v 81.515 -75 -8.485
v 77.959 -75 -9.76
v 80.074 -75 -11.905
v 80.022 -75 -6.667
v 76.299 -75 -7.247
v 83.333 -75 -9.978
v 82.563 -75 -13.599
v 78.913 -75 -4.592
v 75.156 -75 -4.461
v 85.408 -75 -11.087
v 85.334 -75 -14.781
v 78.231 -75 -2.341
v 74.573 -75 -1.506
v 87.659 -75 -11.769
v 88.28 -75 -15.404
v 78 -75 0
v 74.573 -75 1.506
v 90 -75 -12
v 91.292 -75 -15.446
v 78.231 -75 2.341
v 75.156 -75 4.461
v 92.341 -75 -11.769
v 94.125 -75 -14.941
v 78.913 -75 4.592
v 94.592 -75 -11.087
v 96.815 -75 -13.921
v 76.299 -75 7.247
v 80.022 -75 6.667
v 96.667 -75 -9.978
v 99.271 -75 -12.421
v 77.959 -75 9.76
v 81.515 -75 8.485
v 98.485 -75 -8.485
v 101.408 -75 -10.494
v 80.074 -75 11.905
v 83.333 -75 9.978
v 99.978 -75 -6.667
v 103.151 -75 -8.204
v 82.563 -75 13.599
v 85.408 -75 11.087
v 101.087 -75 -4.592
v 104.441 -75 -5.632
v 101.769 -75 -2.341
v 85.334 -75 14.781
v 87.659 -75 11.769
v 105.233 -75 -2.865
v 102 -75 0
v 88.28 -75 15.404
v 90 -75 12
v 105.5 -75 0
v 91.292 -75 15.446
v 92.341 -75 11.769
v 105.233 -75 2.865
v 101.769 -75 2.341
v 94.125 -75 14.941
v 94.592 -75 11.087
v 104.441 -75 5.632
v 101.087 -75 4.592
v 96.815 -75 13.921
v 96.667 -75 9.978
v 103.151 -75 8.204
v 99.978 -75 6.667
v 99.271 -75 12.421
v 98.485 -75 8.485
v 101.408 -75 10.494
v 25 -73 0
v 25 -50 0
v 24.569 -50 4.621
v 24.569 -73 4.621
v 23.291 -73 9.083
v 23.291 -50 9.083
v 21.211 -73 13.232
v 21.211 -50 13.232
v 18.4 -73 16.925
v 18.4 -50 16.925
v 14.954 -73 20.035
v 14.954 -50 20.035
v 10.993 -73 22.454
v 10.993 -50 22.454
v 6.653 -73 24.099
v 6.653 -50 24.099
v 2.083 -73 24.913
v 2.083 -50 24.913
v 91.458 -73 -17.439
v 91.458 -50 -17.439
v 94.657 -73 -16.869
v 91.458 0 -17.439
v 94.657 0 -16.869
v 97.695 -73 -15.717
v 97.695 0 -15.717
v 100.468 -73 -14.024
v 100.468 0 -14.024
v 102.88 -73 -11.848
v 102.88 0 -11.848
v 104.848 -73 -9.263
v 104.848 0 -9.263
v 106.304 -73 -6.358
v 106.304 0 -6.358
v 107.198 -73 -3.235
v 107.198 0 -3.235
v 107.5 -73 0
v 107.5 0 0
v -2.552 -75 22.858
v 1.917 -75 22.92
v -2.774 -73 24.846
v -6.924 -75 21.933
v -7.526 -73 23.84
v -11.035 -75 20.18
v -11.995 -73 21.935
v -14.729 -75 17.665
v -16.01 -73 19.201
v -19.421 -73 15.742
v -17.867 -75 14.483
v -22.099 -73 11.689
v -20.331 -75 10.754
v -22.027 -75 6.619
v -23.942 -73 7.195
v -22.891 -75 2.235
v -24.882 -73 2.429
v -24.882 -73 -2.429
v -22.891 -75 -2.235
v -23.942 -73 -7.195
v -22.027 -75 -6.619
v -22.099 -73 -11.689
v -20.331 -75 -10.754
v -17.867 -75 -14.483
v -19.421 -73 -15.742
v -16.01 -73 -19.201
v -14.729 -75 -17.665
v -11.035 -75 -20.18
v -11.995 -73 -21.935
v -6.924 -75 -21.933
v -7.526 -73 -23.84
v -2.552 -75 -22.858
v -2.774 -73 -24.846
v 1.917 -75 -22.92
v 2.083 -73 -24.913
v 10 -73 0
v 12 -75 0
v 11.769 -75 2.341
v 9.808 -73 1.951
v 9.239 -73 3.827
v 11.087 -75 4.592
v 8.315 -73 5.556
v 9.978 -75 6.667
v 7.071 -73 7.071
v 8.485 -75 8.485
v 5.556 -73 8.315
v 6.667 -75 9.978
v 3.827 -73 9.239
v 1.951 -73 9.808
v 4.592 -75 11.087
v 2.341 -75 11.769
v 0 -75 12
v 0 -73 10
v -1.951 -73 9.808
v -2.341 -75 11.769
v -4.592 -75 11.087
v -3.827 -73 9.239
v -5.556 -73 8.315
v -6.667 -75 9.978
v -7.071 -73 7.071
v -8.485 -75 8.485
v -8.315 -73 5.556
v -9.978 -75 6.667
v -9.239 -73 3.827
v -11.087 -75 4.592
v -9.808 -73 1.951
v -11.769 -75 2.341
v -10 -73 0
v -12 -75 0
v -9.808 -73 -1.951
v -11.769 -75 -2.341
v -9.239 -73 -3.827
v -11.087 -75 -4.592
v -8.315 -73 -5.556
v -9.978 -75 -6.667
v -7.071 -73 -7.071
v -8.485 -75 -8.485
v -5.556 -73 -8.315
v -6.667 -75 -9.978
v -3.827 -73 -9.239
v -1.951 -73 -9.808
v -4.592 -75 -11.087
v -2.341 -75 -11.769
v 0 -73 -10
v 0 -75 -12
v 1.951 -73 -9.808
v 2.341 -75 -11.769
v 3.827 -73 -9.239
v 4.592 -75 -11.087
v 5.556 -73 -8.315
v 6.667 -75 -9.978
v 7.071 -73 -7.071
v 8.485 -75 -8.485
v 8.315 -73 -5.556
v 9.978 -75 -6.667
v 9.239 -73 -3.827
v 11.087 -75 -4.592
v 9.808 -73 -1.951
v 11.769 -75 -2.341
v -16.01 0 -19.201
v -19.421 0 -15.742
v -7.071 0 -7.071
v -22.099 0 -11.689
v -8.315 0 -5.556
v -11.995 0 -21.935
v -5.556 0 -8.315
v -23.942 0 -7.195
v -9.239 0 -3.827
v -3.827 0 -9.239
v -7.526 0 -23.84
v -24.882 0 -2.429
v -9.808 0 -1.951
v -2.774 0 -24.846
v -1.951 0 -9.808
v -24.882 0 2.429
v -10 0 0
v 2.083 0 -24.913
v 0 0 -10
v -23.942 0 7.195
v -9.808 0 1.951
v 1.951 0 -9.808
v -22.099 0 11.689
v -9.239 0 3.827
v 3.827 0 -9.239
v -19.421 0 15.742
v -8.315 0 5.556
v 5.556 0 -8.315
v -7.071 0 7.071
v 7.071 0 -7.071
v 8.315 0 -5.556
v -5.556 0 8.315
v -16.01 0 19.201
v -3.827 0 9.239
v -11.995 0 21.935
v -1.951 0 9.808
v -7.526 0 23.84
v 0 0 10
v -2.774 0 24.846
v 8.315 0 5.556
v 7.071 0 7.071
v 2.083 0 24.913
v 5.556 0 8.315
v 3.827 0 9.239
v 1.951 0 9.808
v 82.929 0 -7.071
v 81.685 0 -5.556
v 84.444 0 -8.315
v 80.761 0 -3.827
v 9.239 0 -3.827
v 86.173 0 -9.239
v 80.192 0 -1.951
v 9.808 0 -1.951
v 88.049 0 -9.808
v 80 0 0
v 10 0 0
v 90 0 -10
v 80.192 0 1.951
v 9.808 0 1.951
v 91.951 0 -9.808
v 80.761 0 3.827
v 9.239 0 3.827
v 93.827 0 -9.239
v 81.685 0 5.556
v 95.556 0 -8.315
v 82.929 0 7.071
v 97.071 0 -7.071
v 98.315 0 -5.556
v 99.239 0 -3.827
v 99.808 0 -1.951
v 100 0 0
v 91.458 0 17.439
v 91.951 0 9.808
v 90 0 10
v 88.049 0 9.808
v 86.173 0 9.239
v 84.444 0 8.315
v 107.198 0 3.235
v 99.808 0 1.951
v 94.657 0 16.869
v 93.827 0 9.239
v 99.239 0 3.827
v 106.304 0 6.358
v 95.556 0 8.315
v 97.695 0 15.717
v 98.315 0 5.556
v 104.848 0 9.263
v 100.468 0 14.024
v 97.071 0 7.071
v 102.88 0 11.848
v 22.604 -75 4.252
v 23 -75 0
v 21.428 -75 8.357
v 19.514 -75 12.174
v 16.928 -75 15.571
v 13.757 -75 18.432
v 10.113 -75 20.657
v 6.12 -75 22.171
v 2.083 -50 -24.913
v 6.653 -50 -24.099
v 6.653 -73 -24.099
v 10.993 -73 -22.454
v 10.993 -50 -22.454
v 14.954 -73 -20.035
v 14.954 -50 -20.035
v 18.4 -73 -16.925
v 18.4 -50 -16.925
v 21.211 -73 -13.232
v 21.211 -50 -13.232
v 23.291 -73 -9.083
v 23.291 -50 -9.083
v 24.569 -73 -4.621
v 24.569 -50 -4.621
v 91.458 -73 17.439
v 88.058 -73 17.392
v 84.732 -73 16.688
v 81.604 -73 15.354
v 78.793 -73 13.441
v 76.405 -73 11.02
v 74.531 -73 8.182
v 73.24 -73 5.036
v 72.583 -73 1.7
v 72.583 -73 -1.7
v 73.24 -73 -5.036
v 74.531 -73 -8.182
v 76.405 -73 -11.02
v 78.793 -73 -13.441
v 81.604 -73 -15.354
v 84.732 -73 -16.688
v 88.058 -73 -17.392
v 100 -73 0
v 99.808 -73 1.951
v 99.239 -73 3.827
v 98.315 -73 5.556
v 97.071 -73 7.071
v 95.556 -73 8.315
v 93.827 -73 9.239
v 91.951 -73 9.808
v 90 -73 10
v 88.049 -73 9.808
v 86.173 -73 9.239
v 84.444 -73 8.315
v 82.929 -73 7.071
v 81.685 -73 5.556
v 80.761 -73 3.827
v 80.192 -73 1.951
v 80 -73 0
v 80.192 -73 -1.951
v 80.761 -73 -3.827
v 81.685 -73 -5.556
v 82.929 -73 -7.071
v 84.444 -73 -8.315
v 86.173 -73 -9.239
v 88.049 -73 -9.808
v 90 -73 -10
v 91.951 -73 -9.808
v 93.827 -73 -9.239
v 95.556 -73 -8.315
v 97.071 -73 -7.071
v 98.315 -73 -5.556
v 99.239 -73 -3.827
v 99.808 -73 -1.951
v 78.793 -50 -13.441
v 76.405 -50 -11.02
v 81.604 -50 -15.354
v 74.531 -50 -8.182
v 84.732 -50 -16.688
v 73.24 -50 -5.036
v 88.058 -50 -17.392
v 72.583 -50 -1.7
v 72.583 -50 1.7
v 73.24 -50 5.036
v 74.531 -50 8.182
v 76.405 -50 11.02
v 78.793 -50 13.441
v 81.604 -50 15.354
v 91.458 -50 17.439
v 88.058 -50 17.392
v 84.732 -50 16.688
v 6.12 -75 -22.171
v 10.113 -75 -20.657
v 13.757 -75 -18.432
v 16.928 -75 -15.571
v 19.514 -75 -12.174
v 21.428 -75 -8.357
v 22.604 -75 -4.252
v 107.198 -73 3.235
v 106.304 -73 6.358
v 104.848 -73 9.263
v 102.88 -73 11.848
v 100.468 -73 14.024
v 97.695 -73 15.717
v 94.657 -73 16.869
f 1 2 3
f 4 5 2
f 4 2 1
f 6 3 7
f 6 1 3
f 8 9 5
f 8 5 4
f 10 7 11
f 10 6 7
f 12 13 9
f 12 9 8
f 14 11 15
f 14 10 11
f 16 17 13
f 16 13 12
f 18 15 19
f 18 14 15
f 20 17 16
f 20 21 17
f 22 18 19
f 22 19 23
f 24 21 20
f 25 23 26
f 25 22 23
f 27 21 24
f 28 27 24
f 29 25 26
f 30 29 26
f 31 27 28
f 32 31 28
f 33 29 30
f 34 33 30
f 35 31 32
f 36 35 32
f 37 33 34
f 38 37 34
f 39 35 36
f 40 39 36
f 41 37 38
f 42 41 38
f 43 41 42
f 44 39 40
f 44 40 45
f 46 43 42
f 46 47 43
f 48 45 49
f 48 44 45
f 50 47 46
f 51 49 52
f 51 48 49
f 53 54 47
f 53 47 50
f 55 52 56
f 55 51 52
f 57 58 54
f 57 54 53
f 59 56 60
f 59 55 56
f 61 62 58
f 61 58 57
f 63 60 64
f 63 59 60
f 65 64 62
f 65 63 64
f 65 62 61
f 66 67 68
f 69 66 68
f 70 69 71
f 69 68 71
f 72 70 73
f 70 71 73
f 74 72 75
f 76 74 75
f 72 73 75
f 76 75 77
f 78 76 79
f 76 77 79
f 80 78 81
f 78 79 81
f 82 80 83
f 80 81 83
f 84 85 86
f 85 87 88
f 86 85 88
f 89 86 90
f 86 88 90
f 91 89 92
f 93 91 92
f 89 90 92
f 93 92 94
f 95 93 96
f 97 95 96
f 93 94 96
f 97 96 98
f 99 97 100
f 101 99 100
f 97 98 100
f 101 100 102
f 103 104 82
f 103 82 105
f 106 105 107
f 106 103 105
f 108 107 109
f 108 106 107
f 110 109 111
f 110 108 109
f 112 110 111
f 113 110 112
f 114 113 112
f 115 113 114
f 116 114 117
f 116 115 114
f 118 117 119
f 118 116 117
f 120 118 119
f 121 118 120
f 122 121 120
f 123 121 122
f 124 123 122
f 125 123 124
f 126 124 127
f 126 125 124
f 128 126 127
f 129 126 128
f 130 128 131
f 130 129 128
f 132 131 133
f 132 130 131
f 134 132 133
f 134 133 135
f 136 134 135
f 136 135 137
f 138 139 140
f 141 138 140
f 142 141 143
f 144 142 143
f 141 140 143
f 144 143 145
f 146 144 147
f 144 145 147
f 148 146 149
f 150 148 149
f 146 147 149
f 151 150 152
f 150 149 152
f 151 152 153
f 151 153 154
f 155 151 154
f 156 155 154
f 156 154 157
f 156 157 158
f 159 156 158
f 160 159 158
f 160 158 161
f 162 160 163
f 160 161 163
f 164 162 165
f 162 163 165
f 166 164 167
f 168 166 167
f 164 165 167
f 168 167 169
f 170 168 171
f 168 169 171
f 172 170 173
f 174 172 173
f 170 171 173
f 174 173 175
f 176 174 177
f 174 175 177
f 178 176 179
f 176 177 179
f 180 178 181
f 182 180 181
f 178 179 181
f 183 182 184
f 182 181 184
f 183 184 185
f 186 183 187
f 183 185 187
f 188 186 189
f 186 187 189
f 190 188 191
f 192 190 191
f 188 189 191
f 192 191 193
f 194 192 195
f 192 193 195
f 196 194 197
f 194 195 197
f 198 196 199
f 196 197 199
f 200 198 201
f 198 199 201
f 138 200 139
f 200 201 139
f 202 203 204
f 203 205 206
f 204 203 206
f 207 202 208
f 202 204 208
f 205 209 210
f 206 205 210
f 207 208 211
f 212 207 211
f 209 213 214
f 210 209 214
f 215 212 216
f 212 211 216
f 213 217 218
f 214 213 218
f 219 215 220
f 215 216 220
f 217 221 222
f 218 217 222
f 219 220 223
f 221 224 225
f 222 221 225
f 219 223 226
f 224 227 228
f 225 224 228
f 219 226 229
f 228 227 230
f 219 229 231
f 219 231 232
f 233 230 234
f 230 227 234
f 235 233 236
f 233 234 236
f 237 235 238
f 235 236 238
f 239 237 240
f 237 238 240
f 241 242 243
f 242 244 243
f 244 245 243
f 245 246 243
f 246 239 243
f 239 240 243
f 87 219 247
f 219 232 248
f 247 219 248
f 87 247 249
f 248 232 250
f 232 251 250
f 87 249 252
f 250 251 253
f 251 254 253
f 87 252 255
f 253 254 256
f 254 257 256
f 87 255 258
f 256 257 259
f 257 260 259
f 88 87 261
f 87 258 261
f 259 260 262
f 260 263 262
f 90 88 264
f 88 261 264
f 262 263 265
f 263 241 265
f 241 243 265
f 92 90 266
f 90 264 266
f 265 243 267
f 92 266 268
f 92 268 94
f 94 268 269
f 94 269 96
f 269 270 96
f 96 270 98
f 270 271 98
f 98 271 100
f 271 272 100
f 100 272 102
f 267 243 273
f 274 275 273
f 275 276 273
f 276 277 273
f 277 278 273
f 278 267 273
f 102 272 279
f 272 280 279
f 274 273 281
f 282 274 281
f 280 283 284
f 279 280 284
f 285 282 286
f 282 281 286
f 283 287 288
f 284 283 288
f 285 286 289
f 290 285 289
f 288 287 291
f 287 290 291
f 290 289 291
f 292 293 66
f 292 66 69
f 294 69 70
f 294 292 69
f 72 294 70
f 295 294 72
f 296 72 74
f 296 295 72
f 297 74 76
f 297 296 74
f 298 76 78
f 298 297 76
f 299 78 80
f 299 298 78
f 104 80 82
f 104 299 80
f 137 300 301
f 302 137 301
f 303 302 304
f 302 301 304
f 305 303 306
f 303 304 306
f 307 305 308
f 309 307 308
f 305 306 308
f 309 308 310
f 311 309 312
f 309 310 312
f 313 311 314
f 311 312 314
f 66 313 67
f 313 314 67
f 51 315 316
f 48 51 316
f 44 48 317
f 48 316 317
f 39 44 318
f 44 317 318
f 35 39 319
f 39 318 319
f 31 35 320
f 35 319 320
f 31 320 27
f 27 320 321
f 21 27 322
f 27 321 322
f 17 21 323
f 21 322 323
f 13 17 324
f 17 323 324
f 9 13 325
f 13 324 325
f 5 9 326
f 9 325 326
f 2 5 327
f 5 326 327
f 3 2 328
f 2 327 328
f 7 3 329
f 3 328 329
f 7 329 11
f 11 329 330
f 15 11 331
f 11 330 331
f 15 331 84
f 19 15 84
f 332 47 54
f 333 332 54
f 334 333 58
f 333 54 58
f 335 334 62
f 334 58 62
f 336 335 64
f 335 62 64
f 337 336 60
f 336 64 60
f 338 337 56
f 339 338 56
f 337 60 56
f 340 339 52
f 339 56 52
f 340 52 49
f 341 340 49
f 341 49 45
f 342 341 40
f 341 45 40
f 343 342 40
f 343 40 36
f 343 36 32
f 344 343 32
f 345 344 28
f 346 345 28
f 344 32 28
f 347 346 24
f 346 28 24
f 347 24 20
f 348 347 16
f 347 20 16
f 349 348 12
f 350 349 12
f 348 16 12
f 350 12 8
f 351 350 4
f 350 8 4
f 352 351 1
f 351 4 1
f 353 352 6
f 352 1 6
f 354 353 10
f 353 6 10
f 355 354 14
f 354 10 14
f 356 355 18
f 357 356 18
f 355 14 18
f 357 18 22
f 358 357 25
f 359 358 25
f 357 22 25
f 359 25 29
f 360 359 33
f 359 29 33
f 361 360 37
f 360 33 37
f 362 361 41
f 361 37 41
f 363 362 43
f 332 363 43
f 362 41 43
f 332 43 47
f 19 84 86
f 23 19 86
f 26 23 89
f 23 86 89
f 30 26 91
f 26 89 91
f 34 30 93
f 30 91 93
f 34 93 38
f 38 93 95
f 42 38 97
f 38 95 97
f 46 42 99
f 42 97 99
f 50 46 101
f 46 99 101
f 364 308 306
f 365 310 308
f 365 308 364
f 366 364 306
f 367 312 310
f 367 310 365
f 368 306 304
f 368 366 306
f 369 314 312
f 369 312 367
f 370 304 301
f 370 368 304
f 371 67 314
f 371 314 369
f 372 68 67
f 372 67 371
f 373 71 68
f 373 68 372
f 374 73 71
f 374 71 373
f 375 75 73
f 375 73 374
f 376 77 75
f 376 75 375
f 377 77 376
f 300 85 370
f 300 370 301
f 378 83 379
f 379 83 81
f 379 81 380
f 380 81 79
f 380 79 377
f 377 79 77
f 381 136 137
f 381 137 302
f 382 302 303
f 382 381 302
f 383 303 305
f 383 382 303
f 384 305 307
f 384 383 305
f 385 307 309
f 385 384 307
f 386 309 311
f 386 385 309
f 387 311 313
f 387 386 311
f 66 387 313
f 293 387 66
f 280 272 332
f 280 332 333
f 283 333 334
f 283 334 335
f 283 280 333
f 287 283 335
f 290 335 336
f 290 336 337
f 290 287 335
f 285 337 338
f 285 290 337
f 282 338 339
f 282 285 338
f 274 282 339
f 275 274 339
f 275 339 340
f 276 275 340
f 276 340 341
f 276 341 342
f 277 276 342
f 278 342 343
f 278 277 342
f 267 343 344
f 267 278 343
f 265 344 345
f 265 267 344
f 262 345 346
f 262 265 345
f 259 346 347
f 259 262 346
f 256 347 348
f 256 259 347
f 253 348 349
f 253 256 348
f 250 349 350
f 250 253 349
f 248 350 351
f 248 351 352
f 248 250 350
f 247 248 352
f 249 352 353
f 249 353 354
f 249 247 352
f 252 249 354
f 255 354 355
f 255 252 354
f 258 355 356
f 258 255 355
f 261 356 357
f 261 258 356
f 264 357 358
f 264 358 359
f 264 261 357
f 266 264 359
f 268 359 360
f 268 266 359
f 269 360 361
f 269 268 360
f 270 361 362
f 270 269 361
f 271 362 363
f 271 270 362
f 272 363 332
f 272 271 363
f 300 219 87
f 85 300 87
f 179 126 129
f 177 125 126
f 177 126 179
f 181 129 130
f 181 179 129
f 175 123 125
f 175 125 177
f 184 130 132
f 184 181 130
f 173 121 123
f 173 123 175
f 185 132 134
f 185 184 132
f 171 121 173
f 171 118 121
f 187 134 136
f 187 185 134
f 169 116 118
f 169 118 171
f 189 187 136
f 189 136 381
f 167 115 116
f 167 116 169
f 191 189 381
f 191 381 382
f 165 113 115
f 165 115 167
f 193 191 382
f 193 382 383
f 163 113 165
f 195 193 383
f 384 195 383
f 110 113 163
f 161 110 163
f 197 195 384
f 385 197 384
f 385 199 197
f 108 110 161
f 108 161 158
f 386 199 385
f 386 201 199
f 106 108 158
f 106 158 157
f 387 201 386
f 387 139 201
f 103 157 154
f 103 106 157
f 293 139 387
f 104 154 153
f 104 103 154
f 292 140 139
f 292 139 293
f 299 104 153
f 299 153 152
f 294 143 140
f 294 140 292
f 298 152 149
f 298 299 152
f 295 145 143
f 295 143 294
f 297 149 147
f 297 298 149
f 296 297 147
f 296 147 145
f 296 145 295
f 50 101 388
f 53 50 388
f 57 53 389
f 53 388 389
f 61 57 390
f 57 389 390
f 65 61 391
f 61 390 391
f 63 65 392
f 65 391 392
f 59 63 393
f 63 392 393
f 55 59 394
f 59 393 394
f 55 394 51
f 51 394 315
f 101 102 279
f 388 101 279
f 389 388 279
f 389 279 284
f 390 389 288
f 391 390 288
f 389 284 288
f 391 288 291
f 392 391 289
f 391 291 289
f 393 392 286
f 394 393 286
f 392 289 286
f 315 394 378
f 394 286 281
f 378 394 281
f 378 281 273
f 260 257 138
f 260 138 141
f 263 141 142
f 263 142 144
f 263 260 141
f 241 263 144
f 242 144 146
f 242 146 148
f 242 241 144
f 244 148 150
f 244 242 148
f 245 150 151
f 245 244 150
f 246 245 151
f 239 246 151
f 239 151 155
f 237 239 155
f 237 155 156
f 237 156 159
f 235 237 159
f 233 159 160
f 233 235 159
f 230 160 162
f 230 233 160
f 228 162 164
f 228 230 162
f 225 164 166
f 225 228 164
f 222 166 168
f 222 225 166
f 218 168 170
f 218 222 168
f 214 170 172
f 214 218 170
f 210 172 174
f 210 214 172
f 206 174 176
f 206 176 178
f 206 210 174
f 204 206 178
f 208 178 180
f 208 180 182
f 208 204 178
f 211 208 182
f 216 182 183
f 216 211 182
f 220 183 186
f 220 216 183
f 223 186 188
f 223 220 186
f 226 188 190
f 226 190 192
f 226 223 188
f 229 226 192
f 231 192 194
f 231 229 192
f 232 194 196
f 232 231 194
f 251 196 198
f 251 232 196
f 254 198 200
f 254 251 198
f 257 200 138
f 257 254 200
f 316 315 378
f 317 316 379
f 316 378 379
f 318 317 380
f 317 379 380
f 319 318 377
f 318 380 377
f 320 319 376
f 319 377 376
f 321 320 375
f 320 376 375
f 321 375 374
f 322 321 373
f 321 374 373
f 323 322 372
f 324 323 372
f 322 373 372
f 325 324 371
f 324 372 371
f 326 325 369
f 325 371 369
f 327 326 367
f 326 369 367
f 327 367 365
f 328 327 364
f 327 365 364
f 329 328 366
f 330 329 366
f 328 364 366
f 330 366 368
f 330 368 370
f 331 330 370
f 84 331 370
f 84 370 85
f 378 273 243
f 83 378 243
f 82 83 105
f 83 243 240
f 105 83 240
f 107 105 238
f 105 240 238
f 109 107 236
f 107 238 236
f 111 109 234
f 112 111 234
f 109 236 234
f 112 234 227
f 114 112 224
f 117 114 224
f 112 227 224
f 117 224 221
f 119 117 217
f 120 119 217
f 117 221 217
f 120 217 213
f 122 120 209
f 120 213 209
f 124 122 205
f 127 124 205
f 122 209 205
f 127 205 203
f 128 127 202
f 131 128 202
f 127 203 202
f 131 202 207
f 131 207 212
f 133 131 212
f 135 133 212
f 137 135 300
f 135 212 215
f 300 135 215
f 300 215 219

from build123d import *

# Parameters (mm, degrees)
F0_R     = 10
F1_DEPTH = 50
F2_DEPTH = 75
F3_SIZE  = 2


with BuildPart() as f1:
    # F0 (on Front) → F1 (new body)
    with BuildSketch(Plane.XZ):
        with BuildLine():
            ThreePointArc((2.083333, 24.913043), (18.399502, 16.92508), (25, 0))
            ThreePointArc((25, 0), (18.399502, -16.92508), (2.083333, -24.913043))
            Line((2.083333, -24.913043), (91.458333, -17.43913))
            ThreePointArc((91.458333, -17.43913), (72.5, 0), (91.458333, 17.43913))
            Line((91.458333, 17.43913), (2.083333, 24.913043))
        make_face()
        with BuildLine():
            ThreePointArc((2.083333, -24.913043), (18.399502, -16.92508), (25, 0))
            ThreePointArc((25, 0), (18.399502, 16.92508), (2.083333, 24.913043))
            ThreePointArc((2.083333, 24.913043), (-25, 0), (2.083333, -24.913043))
        make_face()
        Circle(F0_R, mode=Mode.SUBTRACT)
        with BuildLine():
            ThreePointArc((107.5, 0), (102.879651, 11.847556), (91.458333, 17.43913))
            ThreePointArc((91.458333, 17.43913), (72.5, 0), (91.458333, -17.43913))
            ThreePointArc((91.458333, -17.43913), (102.879651, -11.847556), (107.5, 0))
        make_face()
        with Locations((90, 0)):
            Circle(F0_R, mode=Mode.SUBTRACT)
    extrude(amount=F1_DEPTH)

    # F0 (on Front) → F2 (join)
    with BuildSketch(Plane.XZ):
        with BuildLine():
            ThreePointArc((2.083333, -24.913043), (18.399502, -16.92508), (25, 0))
            ThreePointArc((25, 0), (18.399502, 16.92508), (2.083333, 24.913043))
            ThreePointArc((2.083333, 24.913043), (-25, 0), (2.083333, -24.913043))
        make_face()
        Circle(F0_R, mode=Mode.SUBTRACT)
        with BuildLine():
            ThreePointArc((107.5, 0), (102.879651, 11.847556), (91.458333, 17.43913))
            ThreePointArc((91.458333, 17.43913), (72.5, 0), (91.458333, -17.43913))
            ThreePointArc((91.458333, -17.43913), (102.879651, -11.847556), (107.5, 0))
        make_face()
        with Locations((90, 0)):
            Circle(F0_R, mode=Mode.SUBTRACT)
    extrude(amount=F2_DEPTH)

    # F3
    f3_edges = [f1.edges().sort_by_distance(p)[0] for p in [
        (-10, -75, 0),
        (-2.083333, -75, 24.913043),
        (80, -75, 0),
        (88.541667, -75, 17.43913),
    ]]
    chamfer(f3_edges, length=F3_SIZE)


solid = f1.part
